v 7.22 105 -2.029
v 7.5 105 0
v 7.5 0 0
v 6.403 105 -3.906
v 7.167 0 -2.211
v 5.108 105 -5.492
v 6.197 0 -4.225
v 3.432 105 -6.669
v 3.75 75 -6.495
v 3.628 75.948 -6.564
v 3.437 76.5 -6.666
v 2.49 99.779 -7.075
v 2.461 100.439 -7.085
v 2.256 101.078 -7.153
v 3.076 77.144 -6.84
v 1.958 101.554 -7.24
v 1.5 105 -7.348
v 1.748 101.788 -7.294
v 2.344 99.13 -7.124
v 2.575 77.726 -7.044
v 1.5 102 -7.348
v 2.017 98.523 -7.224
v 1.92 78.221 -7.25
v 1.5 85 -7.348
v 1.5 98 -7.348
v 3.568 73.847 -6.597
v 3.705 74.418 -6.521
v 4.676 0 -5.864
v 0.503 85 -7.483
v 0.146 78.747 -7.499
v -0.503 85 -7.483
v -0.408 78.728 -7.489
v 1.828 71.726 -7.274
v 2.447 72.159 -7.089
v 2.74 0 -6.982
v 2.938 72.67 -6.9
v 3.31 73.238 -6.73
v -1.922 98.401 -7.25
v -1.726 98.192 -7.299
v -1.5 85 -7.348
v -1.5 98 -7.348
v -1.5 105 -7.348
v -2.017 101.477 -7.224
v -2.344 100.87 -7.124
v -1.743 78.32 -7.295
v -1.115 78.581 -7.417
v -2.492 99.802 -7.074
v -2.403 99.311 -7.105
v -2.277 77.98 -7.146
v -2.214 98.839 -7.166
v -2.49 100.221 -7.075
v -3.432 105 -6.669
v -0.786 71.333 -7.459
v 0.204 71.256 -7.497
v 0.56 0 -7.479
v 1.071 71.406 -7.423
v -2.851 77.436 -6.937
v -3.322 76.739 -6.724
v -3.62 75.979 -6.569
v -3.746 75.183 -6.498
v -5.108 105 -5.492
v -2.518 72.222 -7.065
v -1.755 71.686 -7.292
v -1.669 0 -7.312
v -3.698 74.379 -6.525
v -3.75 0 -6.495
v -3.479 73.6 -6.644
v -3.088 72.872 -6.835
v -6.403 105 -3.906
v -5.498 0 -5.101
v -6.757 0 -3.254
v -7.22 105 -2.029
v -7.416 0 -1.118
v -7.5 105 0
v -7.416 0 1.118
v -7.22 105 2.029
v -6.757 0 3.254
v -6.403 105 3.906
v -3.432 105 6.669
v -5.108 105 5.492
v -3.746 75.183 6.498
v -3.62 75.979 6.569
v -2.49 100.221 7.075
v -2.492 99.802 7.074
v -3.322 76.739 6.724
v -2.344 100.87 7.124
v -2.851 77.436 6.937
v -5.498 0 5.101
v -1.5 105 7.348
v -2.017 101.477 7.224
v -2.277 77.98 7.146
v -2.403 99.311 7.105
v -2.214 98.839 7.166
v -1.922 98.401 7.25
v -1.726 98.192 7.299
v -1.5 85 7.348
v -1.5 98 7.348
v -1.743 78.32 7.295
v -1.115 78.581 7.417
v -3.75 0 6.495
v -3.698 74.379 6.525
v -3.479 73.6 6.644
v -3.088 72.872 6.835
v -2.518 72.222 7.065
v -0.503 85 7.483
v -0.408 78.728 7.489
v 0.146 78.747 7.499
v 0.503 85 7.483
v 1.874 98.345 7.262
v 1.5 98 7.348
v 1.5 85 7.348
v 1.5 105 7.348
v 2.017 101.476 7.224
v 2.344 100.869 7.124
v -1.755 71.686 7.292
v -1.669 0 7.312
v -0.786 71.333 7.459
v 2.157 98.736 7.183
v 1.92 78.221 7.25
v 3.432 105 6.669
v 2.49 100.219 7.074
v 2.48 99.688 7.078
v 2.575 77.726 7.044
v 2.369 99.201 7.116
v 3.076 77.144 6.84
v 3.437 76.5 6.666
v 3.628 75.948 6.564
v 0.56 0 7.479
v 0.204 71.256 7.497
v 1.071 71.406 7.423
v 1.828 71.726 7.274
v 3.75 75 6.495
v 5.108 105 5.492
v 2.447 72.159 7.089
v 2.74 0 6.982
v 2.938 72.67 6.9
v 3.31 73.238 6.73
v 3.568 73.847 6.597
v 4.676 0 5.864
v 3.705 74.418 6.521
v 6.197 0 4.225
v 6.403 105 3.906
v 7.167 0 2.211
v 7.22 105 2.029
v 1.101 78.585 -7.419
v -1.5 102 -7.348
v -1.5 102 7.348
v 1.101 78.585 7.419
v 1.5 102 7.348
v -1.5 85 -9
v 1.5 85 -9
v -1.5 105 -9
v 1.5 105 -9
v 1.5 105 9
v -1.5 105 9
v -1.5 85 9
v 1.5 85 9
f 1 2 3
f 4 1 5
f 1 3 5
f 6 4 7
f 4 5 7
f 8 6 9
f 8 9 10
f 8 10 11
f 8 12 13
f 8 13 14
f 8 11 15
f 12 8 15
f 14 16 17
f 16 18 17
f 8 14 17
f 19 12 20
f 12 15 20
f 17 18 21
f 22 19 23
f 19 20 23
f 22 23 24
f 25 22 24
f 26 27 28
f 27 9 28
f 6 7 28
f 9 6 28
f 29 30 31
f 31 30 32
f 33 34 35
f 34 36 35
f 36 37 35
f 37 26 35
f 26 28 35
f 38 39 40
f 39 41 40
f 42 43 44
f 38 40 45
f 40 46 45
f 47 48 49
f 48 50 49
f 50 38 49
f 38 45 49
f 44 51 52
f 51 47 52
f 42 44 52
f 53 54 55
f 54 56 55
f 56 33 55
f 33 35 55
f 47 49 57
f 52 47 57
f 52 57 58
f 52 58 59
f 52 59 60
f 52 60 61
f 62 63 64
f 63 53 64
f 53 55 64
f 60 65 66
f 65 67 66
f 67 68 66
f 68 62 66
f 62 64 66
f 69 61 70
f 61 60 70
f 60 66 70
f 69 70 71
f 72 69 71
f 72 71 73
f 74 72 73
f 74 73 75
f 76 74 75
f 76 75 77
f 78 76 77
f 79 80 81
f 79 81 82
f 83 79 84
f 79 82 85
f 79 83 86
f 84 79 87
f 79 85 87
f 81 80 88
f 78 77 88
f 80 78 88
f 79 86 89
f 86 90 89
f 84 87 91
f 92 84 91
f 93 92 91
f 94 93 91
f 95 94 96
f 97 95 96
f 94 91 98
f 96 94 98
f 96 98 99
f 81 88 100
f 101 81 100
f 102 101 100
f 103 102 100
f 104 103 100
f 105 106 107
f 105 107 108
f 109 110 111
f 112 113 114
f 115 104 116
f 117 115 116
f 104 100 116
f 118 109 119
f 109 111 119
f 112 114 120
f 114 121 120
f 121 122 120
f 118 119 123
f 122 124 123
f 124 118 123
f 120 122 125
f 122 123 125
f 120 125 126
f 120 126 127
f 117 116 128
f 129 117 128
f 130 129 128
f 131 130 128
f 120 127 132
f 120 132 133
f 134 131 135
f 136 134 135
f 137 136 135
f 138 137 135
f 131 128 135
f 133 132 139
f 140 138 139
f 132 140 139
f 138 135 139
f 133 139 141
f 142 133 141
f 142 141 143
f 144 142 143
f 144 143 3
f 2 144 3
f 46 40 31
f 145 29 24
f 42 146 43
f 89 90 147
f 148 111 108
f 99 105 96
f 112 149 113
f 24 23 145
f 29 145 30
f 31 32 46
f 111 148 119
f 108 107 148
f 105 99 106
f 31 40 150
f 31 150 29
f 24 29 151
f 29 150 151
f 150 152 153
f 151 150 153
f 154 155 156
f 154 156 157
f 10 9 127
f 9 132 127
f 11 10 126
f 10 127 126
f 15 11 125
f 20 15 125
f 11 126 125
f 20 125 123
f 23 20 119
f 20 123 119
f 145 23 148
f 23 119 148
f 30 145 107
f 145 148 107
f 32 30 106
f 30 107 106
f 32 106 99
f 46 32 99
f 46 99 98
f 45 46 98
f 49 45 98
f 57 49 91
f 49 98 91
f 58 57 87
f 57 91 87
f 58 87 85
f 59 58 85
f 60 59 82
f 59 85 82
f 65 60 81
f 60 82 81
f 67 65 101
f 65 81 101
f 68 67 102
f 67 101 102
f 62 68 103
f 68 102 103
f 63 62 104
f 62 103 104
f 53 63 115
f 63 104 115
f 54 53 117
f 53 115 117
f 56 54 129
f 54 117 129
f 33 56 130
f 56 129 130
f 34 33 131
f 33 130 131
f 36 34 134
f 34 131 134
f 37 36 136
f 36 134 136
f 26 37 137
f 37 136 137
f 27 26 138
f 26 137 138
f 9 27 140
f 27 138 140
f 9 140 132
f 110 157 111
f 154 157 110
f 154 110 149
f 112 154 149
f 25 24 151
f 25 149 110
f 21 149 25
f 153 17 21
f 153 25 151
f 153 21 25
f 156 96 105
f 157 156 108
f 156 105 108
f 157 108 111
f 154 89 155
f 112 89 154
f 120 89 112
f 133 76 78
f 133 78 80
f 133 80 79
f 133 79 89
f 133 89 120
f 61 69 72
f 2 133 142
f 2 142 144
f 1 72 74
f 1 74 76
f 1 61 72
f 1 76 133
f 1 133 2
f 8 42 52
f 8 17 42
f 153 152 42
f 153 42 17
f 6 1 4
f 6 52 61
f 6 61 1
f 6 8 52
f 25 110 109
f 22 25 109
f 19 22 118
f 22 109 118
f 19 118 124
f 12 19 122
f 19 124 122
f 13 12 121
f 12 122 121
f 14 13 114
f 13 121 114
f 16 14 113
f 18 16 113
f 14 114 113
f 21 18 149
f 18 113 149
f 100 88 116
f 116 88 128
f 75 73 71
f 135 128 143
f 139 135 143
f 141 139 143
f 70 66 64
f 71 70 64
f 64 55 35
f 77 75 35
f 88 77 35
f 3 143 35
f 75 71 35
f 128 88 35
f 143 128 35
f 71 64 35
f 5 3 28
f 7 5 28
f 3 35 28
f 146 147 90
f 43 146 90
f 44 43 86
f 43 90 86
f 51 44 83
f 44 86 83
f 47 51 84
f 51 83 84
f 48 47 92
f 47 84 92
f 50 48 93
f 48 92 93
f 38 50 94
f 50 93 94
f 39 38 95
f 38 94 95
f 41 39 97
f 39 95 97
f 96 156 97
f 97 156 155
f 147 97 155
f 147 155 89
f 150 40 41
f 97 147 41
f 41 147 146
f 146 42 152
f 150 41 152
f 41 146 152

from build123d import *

# Parameters (mm, degrees)
SKETCH1_R               = 7.5
BOSS_EXTRUDE1_DEPTH     = 105
SKETCH2_R               = 3.75
CUT_EXTRUDE1_DEPTH      = 8.5
CUT_EXTRUDE1_DEPTH_BACK = 8.5
SKETCH3_R               = 2.5
CUT_EXTRUDE2_DEPTH      = 10
CUT_EXTRUDE2_DEPTH_BACK = 10
SKETCH4_W               = 3
SKETCH4_H               = 18
BOSS_EXTRUDE2_DEPTH     = 20


with BuildPart() as part:
    # Sketch1 → Boss-Extrude1 (new body)
    with BuildSketch(Plane(origin=(0, 0, 0), x_dir=(1, 0, 0), z_dir=(0, 1, 0))):
        Circle(SKETCH1_R)
    extrude(amount=BOSS_EXTRUDE1_DEPTH)

    # Sketch2 → Cut-Extrude1 (cut, two sides)
    with BuildSketch(Plane.XY) as cut_extrude1_sk:
        with Locations((0, 75)):
            Circle(SKETCH2_R)
    extrude(amount=CUT_EXTRUDE1_DEPTH, mode=Mode.SUBTRACT)
    extrude(cut_extrude1_sk.sketch, amount=-CUT_EXTRUDE1_DEPTH_BACK, mode=Mode.SUBTRACT)

    # Sketch3 → Cut-Extrude2 (cut, two sides)
    with BuildSketch(Plane.XY) as cut_extrude2_sk:
        with Locations((0, 100)):
            Circle(SKETCH3_R)
    extrude(amount=CUT_EXTRUDE2_DEPTH, mode=Mode.SUBTRACT)
    extrude(cut_extrude2_sk.sketch, amount=-CUT_EXTRUDE2_DEPTH_BACK, mode=Mode.SUBTRACT)

    # Sketch4 → Boss-Extrude2 (add)
    with BuildSketch(Plane(origin=(0, 105, 0), x_dir=(1, 0, 0), z_dir=(0, 1, 0))):
        Rectangle(SKETCH4_W, SKETCH4_H)
    extrude(amount=-BOSS_EXTRUDE2_DEPTH)


solid = part.part
